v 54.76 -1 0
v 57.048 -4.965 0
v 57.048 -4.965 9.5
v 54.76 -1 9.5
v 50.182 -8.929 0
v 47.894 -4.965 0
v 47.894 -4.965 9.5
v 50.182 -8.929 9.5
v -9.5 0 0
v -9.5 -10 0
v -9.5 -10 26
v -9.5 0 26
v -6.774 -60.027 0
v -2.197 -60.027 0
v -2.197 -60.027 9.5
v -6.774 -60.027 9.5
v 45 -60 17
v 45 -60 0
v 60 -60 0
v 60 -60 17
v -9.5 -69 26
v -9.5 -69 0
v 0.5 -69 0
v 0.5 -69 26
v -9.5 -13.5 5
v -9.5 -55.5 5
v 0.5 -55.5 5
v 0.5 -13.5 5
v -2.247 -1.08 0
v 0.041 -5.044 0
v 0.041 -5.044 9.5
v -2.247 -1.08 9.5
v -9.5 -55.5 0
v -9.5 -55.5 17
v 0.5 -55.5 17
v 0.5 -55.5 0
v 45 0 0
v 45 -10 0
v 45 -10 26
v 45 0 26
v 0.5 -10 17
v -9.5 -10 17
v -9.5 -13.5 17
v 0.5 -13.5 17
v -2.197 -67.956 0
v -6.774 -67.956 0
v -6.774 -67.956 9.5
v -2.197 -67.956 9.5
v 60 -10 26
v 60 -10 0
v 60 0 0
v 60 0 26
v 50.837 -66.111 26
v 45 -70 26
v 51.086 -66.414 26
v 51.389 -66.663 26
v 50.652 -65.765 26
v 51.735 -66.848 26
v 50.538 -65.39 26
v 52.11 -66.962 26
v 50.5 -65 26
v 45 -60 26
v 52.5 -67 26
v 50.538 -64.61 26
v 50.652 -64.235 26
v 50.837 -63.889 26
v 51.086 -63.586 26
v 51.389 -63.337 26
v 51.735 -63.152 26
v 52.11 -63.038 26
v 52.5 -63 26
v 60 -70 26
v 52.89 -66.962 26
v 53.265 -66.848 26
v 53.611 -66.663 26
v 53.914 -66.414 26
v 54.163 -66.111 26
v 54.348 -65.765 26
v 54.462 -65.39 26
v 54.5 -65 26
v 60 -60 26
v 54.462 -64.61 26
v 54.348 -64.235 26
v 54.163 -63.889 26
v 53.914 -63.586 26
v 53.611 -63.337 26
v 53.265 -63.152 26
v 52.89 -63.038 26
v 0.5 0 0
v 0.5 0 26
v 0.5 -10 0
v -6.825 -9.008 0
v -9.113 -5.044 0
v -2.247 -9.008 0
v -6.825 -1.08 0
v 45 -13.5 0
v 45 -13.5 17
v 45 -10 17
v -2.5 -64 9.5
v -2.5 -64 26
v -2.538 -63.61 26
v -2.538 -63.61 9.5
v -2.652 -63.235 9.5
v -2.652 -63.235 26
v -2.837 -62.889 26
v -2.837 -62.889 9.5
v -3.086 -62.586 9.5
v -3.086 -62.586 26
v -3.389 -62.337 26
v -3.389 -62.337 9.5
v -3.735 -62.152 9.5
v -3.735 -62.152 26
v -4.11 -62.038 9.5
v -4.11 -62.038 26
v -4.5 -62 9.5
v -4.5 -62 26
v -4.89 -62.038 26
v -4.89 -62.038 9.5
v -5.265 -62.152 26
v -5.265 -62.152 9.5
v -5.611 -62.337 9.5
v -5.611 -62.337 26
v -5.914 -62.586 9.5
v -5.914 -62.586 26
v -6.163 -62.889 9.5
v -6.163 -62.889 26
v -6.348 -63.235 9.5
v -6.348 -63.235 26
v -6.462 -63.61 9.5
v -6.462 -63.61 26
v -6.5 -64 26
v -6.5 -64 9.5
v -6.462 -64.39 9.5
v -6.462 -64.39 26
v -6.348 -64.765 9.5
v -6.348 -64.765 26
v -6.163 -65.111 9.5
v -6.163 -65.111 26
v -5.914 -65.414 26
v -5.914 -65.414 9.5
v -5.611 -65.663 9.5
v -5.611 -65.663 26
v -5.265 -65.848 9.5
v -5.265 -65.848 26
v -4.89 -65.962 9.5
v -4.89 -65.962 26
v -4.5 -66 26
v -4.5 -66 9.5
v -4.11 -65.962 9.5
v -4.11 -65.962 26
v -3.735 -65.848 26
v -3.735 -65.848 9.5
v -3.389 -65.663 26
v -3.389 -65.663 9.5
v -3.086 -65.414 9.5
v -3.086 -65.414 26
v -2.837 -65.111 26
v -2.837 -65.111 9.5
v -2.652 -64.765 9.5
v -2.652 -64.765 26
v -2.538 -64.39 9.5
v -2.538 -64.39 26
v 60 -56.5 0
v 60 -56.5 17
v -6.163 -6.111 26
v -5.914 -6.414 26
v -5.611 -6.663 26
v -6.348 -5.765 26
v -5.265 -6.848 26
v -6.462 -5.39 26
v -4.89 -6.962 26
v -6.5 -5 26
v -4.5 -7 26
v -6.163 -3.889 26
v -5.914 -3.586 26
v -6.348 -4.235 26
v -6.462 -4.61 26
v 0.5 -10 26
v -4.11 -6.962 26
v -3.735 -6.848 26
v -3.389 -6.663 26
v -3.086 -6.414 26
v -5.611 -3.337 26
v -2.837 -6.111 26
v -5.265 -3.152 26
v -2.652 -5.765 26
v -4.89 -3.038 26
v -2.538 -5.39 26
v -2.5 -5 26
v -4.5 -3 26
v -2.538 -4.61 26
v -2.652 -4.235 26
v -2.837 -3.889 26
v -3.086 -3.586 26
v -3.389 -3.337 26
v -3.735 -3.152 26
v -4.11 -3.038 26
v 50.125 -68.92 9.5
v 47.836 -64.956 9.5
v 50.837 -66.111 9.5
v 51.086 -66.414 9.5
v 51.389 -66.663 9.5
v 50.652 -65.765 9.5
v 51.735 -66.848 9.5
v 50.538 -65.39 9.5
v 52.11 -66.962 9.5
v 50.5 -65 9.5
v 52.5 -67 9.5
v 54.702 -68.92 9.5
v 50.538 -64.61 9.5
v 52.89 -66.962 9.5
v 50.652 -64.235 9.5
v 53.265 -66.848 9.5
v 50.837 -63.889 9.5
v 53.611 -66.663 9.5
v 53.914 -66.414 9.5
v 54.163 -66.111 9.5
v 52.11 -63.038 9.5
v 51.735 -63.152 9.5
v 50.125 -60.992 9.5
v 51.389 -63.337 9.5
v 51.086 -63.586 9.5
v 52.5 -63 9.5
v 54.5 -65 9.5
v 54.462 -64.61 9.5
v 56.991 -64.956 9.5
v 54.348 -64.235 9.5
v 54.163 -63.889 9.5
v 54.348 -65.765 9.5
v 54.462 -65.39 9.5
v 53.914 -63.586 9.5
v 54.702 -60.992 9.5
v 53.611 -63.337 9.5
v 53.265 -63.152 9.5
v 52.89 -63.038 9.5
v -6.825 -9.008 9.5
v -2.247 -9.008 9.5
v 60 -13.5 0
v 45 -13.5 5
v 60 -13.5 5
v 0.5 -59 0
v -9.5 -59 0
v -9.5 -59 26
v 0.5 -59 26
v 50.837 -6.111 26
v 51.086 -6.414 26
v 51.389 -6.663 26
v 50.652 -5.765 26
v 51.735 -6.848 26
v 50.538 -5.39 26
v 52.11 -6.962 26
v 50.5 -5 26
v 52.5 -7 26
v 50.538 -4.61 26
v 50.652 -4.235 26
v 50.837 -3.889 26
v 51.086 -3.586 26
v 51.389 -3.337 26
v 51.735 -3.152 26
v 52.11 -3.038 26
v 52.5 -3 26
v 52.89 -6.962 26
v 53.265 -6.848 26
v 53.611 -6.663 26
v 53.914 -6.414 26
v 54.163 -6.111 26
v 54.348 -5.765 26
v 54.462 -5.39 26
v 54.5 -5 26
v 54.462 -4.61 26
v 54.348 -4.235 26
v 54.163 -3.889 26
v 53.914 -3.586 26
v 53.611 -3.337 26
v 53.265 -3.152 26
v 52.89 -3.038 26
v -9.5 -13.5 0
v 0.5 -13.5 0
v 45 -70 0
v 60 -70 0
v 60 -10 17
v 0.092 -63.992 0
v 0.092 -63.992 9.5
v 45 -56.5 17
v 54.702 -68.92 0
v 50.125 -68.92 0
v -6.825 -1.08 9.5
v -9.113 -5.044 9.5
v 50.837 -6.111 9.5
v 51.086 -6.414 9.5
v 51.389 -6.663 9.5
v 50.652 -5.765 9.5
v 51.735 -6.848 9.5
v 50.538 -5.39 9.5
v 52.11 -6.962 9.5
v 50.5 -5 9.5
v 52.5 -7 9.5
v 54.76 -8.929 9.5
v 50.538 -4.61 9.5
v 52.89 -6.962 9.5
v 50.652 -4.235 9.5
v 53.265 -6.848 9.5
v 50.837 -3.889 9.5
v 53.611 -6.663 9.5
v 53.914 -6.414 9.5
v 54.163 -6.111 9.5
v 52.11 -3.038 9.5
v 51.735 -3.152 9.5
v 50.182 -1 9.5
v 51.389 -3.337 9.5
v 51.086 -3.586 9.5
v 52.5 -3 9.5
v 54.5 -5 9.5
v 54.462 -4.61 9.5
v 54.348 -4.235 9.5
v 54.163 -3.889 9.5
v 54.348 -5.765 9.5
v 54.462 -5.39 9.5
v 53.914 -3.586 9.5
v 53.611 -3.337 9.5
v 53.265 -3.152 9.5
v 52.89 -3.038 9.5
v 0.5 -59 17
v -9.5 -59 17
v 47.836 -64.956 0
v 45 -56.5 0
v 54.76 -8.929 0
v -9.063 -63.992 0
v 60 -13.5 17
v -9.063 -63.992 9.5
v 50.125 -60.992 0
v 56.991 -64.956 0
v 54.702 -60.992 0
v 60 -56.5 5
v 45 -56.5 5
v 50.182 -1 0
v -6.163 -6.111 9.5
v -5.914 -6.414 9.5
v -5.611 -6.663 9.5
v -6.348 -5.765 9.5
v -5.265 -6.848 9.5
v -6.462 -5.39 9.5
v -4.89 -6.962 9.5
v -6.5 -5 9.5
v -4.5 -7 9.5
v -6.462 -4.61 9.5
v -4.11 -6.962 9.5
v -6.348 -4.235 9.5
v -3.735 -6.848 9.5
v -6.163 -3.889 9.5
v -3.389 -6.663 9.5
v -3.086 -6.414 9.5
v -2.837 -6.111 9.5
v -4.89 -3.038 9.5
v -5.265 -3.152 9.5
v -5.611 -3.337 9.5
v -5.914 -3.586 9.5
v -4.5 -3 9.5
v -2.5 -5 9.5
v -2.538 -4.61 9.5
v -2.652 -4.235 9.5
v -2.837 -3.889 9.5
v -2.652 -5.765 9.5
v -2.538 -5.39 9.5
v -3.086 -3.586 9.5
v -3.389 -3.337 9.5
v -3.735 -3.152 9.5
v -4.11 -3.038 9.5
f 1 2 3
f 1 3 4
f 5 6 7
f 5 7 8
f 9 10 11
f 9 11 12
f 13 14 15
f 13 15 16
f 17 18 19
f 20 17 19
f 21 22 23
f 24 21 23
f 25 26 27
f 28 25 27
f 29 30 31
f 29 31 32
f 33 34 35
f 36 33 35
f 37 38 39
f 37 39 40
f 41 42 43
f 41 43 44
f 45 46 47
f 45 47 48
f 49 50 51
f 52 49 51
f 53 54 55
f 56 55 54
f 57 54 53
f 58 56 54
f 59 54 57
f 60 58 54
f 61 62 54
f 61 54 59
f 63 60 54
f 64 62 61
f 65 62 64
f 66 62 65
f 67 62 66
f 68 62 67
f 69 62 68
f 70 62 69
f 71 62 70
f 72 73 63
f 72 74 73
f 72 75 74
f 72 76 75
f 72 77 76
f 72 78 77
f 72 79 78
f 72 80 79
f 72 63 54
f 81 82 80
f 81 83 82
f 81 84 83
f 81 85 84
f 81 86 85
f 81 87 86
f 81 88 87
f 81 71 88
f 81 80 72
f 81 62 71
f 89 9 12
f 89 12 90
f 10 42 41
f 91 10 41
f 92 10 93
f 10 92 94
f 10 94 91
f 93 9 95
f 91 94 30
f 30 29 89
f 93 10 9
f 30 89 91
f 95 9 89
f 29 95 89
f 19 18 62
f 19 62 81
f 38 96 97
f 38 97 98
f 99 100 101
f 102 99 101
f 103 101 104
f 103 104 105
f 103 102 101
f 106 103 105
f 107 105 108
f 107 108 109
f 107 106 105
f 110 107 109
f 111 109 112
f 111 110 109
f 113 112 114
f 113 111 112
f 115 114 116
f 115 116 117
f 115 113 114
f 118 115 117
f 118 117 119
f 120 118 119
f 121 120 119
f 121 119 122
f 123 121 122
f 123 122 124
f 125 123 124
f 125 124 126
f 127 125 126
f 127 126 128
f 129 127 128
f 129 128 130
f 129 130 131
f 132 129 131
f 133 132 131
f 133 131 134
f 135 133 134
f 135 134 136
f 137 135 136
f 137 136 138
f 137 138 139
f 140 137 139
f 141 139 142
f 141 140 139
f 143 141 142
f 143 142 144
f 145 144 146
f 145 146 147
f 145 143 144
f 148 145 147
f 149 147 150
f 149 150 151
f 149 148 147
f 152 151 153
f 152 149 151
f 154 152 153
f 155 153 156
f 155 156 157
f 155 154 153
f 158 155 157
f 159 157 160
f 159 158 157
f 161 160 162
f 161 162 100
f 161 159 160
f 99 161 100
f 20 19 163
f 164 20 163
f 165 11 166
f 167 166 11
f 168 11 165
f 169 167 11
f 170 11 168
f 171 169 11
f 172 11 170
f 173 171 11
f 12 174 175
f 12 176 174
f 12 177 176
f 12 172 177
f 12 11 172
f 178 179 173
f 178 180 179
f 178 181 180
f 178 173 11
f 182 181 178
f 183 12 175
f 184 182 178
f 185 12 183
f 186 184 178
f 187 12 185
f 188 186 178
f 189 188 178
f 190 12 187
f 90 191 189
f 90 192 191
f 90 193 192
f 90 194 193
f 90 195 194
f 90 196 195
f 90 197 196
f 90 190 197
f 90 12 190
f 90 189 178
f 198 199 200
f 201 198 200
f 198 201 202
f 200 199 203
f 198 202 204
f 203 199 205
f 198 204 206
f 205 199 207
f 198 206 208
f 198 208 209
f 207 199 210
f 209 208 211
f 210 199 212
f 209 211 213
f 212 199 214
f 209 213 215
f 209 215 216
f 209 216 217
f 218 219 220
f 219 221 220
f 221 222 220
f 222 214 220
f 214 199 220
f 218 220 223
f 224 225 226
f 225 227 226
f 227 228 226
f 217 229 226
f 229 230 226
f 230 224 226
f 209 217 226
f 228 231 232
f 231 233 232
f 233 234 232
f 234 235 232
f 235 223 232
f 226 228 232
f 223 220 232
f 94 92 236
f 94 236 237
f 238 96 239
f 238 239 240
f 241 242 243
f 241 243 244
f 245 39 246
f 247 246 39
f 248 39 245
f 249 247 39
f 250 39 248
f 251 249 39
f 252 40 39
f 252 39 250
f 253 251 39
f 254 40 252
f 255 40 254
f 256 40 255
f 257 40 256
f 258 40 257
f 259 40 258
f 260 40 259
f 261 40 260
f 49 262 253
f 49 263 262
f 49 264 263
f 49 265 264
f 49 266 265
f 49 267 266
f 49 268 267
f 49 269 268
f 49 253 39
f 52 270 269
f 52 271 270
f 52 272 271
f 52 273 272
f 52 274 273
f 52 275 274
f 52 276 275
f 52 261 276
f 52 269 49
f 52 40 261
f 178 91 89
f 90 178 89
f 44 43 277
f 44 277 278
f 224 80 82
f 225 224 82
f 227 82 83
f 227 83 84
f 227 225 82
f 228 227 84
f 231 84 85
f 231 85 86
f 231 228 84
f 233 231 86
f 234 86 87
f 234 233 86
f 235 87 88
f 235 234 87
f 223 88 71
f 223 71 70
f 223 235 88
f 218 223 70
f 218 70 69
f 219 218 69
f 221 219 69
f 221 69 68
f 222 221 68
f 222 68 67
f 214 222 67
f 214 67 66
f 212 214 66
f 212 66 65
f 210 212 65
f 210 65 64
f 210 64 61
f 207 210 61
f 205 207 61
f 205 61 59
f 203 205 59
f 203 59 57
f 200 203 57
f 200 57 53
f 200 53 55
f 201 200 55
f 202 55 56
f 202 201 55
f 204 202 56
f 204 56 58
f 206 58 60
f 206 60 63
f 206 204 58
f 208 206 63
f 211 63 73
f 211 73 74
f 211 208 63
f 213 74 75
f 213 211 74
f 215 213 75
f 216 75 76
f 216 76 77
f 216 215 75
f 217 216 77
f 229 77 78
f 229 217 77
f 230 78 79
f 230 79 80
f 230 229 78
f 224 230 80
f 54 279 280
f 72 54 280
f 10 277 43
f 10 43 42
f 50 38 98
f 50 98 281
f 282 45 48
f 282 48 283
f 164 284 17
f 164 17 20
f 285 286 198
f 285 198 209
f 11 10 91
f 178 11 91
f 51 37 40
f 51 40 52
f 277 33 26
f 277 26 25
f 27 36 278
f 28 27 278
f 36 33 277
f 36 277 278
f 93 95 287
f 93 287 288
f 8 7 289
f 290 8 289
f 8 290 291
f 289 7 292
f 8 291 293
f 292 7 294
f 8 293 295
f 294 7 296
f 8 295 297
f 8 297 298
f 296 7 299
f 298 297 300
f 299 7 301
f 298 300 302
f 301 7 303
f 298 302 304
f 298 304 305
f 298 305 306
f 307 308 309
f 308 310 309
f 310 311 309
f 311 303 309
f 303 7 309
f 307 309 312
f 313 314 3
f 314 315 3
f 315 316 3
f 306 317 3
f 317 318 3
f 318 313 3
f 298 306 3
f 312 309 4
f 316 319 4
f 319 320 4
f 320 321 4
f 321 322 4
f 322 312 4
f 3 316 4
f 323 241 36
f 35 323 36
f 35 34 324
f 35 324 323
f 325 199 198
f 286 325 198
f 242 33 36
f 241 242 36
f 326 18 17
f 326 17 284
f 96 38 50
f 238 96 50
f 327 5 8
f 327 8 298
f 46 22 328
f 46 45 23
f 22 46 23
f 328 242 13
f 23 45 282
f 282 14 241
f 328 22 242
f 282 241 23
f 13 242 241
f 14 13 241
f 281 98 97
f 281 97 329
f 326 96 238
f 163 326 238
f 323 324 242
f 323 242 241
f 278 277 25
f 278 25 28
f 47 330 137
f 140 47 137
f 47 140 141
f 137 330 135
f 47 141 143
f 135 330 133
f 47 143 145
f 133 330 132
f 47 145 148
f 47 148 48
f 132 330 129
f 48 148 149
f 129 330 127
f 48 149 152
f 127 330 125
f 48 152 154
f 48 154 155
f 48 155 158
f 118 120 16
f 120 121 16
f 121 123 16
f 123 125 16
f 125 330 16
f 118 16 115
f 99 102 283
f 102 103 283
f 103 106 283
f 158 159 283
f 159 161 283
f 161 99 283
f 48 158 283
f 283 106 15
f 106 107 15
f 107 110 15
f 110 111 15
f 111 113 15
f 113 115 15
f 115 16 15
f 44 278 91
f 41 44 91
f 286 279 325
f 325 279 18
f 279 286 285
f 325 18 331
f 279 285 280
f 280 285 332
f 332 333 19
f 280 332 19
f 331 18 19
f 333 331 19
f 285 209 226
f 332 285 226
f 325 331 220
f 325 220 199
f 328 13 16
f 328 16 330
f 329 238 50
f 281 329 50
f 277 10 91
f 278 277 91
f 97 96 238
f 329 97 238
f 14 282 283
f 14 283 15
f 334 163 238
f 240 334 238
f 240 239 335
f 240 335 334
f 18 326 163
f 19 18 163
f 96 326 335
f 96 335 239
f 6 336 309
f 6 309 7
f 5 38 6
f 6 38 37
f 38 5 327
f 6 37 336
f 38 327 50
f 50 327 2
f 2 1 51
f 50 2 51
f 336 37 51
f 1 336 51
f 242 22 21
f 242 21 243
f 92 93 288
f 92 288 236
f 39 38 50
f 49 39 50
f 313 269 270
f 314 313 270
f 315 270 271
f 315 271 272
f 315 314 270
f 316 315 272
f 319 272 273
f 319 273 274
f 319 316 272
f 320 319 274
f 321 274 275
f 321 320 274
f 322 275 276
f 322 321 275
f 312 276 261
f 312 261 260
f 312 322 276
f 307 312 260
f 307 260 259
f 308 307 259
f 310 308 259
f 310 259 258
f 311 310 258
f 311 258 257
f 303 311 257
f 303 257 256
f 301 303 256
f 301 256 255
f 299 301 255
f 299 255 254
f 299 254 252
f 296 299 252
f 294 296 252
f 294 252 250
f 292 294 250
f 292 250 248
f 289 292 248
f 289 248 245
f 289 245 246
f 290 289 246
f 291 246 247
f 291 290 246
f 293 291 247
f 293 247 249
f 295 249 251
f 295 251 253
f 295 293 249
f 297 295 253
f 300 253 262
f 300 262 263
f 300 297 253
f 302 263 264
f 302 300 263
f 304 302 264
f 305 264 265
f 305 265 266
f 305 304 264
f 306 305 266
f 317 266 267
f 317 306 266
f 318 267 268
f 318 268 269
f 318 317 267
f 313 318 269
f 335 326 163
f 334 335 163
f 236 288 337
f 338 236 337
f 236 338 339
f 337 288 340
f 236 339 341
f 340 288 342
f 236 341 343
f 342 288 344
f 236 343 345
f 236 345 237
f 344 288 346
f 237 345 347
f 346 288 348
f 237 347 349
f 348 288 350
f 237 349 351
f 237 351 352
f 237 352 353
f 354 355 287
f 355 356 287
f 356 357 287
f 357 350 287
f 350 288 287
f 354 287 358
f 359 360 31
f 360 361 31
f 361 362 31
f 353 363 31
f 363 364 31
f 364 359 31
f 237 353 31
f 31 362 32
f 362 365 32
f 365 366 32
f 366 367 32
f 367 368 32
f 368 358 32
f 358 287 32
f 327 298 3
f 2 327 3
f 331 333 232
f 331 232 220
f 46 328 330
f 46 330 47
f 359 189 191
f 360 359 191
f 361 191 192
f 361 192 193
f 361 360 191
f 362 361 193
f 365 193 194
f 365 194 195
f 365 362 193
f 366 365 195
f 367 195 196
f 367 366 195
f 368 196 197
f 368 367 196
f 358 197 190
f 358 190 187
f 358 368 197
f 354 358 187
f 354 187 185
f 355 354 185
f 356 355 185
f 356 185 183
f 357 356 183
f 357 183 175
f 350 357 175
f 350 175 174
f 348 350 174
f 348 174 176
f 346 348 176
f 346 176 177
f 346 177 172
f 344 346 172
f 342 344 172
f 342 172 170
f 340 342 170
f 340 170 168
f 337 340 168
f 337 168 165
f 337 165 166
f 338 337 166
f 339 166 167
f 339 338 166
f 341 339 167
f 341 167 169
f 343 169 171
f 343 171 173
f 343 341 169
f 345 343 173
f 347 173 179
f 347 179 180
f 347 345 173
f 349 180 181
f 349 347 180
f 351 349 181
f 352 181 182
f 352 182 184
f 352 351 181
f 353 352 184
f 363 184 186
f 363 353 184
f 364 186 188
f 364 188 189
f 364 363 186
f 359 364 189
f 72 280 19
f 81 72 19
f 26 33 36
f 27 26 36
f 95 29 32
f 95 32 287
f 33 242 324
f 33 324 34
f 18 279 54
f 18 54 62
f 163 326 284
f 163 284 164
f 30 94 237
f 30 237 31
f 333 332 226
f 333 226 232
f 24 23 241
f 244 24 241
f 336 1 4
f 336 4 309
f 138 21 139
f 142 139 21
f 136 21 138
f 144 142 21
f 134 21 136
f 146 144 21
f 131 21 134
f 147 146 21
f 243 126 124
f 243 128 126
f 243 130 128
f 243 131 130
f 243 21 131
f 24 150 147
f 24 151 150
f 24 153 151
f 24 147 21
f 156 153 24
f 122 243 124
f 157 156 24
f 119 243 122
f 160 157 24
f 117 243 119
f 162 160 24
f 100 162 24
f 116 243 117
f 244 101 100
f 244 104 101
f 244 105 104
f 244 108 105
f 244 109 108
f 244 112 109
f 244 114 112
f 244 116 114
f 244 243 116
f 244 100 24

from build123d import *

# Parameters (mm, degrees)
F0_W     = 15
F0_H     = 43
F1_DEPTH = 5
F0_W_2   = 10
F0_H_2   = 42
F0_H_3   = 3.5
F2_DEPTH = 17
F0_H_4   = 10
F0_R     = 2
F3_DEPTH = 26
F4_DEPTH = 9.5


with BuildPart() as f1:
    # F0 (on Top) → F1 (new body)
    with BuildSketch(Plane.XY):
        with Locations((52.5, -35)):
            Rectangle(F0_W, F0_H)
    extrude(amount=F1_DEPTH)


with BuildPart() as f1b:
    # F0 (on Top) → F1, piece 2 (new body)
    with BuildSketch(Plane.XY):
        with Locations((-4.5, -34.5)):
            Rectangle(F0_W_2, F0_H_2)
    extrude(amount=F1_DEPTH)


with BuildPart() as f2:
    # F0 (on Top) → F2 (new body)
    with BuildSketch(Plane.XY):
        with Locations((-4.5, -57.25)):
            Rectangle(F0_W_2, F0_H_3)
    extrude(amount=F2_DEPTH)


with BuildPart() as f2b:
    # F0 (on Top) → F2, piece 2 (new body)
    with BuildSketch(Plane.XY):
        with Locations((-4.5, -11.75)):
            Rectangle(F0_W_2, F0_H_3)
    extrude(amount=F2_DEPTH)


with BuildPart() as f2c:
    # F0 (on Top) → F2, piece 3 (new body)
    with BuildSketch(Plane.XY):
        with Locations((52.5, -11.75)):
            Rectangle(F0_W, F0_H_3)
    extrude(amount=F2_DEPTH)


with BuildPart() as f2d:
    # F0 (on Top) → F2, piece 4 (new body)
    with BuildSketch(Plane.XY):
        with Locations((52.5, -58.25)):
            Rectangle(F0_W, F0_H_3)
    extrude(amount=F2_DEPTH)


with BuildPart() as f3:
    # F0 (on Top) → F3 (new body)
    with BuildSketch(Plane.XY):
        with Locations((52.5, -65)):
            Rectangle(F0_W, F0_H_4)
        Polygon((54.7022840134, -60.9915724967), (56.990959148, -64.9556741118), (54.7022840134, -68.919775727), (50.1249337443, -68.919775727), (47.8362586097, -64.9556741118), (50.1249337443, -60.9915724967), align=None, mode=Mode.SUBTRACT)
        Polygon((54.7022840134, -68.919775727), (56.990959148, -64.9556741118), (54.7022840134, -60.9915724967), (50.1249337443, -60.9915724967), (47.8362586097, -64.9556741118), (50.1249337443, -68.919775727), align=None)
        with Locations((52.5, -65)):
            Circle(F0_R, mode=Mode.SUBTRACT)
    extrude(amount=F3_DEPTH)


with BuildPart() as f3b:
    # F0 (on Top) → F3, piece 2 (new body)
    with BuildSketch(Plane.XY):
        with Locations((-4.5, -64)):
            Rectangle(F0_W_2, F0_H_4)
        Polygon((-2.1969641433, -60.0274599169), (0.0917109913, -63.991561532), (-2.1969641433, -67.9556631472), (-6.7743144124, -67.9556631472), (-9.062989547, -63.991561532), (-6.7743144124, -60.0274599169), align=None, mode=Mode.SUBTRACT)
        Polygon((-2.1969641433, -67.9556631472), (0.0917109913, -63.991561532), (-2.1969641433, -60.0274599169), (-6.7743144124, -60.0274599169), (-9.062989547, -63.991561532), (-6.7743144124, -67.9556631472), align=None)
        with Locations((-4.5, -64)):
            Circle(F0_R, mode=Mode.SUBTRACT)
    extrude(amount=F3_DEPTH)


with BuildPart() as f3c:
    # F0 (on Top) → F3, piece 3 (new body)
    with BuildSketch(Plane.XY):
        with Locations((-4.5, -5)):
            Rectangle(F0_W_2, F0_H_4)
        Polygon((-2.2473798938, -1.0798841726), (0.0412952408, -5.0439857878), (-2.2473798938, -9.0080874029), (-6.824730163, -9.0080874029), (-9.1134052976, -5.0439857878), (-6.824730163, -1.0798841726), align=None, mode=Mode.SUBTRACT)
        Polygon((-2.2473798938, -9.0080874029), (0.0412952408, -5.0439857878), (-2.2473798938, -1.0798841726), (-6.824730163, -1.0798841726), (-9.1134052976, -5.0439857878), (-6.824730163, -9.0080874029), align=None)
        with Locations((-4.5, -5)):
            Circle(F0_R, mode=Mode.SUBTRACT)
    extrude(amount=F3_DEPTH)


with BuildPart() as f3d:
    # F0 (on Top) → F3, piece 4 (new body)
    with BuildSketch(Plane.XY):
        with Locations((52.5, -5)):
            Rectangle(F0_W, F0_H_4)
        Polygon((54.7595640771, -1.0004288528), (57.0482392117, -4.964530468), (54.7595640771, -8.9286320831), (50.1822138079, -8.9286320831), (47.8935386733, -4.964530468), (50.1822138079, -1.0004288528), align=None, mode=Mode.SUBTRACT)
        Polygon((54.7595640771, -8.9286320831), (57.0482392117, -4.964530468), (54.7595640771, -1.0004288528), (50.1822138079, -1.0004288528), (47.8935386733, -4.964530468), (50.1822138079, -8.9286320831), align=None)
        with Locations((52.5, -5)):
            Circle(F0_R, mode=Mode.SUBTRACT)
    extrude(amount=F3_DEPTH)


with BuildPart() as f4_tool:
    # F0 (on Top) → F4 (new body)
    with BuildSketch(Plane.XY):
        Polygon((54.7022840134, -68.919775727), (56.990959148, -64.9556741118), (54.7022840134, -60.9915724967), (50.1249337443, -60.9915724967), (47.8362586097, -64.9556741118), (50.1249337443, -68.919775727), align=None)
        with Locations((52.5, -65)):
            Circle(F0_R, mode=Mode.SUBTRACT)
        Polygon((54.7595640771, -8.9286320831), (57.0482392117, -4.964530468), (54.7595640771, -1.0004288528), (50.1822138079, -1.0004288528), (47.8935386733, -4.964530468), (50.1822138079, -8.9286320831), align=None)
        with Locations((52.5, -5)):
            Circle(F0_R, mode=Mode.SUBTRACT)
        Polygon((-2.1969641433, -67.9556631472), (0.0917109913, -63.991561532), (-2.1969641433, -60.0274599169), (-6.7743144124, -60.0274599169), (-9.062989547, -63.991561532), (-6.7743144124, -67.9556631472), align=None)
        with Locations((-4.5, -64)):
            Circle(F0_R, mode=Mode.SUBTRACT)
        Polygon((-2.2473798938, -9.0080874029), (0.0412952408, -5.0439857878), (-2.2473798938, -1.0798841726), (-6.824730163, -1.0798841726), (-9.1134052976, -5.0439857878), (-6.824730163, -9.0080874029), align=None)
        with Locations((-4.5, -5)):
            Circle(F0_R, mode=Mode.SUBTRACT)
    extrude(amount=F4_DEPTH)


with BuildPart() as f3_1:
    add(f3.part)

    # F4: cut by f4_tool
    add(f4_tool.part, mode=Mode.SUBTRACT)


with BuildPart() as f3b_1:
    add(f3b.part)

    # F4: cut by f4_tool
    add(f4_tool.part, mode=Mode.SUBTRACT)


with BuildPart() as f3c_1:
    add(f3c.part)

    # F4: cut by f4_tool
    add(f4_tool.part, mode=Mode.SUBTRACT)


with BuildPart() as f3d_1:
    add(f3d.part)

    # F4: cut by f4_tool
    add(f4_tool.part, mode=Mode.SUBTRACT)


solid = Compound([f1.part, f1b.part, f2.part, f2b.part, f2c.part, f2d.part, f3_1.part, f3b_1.part, f3c_1.part, f3d_1.part])
